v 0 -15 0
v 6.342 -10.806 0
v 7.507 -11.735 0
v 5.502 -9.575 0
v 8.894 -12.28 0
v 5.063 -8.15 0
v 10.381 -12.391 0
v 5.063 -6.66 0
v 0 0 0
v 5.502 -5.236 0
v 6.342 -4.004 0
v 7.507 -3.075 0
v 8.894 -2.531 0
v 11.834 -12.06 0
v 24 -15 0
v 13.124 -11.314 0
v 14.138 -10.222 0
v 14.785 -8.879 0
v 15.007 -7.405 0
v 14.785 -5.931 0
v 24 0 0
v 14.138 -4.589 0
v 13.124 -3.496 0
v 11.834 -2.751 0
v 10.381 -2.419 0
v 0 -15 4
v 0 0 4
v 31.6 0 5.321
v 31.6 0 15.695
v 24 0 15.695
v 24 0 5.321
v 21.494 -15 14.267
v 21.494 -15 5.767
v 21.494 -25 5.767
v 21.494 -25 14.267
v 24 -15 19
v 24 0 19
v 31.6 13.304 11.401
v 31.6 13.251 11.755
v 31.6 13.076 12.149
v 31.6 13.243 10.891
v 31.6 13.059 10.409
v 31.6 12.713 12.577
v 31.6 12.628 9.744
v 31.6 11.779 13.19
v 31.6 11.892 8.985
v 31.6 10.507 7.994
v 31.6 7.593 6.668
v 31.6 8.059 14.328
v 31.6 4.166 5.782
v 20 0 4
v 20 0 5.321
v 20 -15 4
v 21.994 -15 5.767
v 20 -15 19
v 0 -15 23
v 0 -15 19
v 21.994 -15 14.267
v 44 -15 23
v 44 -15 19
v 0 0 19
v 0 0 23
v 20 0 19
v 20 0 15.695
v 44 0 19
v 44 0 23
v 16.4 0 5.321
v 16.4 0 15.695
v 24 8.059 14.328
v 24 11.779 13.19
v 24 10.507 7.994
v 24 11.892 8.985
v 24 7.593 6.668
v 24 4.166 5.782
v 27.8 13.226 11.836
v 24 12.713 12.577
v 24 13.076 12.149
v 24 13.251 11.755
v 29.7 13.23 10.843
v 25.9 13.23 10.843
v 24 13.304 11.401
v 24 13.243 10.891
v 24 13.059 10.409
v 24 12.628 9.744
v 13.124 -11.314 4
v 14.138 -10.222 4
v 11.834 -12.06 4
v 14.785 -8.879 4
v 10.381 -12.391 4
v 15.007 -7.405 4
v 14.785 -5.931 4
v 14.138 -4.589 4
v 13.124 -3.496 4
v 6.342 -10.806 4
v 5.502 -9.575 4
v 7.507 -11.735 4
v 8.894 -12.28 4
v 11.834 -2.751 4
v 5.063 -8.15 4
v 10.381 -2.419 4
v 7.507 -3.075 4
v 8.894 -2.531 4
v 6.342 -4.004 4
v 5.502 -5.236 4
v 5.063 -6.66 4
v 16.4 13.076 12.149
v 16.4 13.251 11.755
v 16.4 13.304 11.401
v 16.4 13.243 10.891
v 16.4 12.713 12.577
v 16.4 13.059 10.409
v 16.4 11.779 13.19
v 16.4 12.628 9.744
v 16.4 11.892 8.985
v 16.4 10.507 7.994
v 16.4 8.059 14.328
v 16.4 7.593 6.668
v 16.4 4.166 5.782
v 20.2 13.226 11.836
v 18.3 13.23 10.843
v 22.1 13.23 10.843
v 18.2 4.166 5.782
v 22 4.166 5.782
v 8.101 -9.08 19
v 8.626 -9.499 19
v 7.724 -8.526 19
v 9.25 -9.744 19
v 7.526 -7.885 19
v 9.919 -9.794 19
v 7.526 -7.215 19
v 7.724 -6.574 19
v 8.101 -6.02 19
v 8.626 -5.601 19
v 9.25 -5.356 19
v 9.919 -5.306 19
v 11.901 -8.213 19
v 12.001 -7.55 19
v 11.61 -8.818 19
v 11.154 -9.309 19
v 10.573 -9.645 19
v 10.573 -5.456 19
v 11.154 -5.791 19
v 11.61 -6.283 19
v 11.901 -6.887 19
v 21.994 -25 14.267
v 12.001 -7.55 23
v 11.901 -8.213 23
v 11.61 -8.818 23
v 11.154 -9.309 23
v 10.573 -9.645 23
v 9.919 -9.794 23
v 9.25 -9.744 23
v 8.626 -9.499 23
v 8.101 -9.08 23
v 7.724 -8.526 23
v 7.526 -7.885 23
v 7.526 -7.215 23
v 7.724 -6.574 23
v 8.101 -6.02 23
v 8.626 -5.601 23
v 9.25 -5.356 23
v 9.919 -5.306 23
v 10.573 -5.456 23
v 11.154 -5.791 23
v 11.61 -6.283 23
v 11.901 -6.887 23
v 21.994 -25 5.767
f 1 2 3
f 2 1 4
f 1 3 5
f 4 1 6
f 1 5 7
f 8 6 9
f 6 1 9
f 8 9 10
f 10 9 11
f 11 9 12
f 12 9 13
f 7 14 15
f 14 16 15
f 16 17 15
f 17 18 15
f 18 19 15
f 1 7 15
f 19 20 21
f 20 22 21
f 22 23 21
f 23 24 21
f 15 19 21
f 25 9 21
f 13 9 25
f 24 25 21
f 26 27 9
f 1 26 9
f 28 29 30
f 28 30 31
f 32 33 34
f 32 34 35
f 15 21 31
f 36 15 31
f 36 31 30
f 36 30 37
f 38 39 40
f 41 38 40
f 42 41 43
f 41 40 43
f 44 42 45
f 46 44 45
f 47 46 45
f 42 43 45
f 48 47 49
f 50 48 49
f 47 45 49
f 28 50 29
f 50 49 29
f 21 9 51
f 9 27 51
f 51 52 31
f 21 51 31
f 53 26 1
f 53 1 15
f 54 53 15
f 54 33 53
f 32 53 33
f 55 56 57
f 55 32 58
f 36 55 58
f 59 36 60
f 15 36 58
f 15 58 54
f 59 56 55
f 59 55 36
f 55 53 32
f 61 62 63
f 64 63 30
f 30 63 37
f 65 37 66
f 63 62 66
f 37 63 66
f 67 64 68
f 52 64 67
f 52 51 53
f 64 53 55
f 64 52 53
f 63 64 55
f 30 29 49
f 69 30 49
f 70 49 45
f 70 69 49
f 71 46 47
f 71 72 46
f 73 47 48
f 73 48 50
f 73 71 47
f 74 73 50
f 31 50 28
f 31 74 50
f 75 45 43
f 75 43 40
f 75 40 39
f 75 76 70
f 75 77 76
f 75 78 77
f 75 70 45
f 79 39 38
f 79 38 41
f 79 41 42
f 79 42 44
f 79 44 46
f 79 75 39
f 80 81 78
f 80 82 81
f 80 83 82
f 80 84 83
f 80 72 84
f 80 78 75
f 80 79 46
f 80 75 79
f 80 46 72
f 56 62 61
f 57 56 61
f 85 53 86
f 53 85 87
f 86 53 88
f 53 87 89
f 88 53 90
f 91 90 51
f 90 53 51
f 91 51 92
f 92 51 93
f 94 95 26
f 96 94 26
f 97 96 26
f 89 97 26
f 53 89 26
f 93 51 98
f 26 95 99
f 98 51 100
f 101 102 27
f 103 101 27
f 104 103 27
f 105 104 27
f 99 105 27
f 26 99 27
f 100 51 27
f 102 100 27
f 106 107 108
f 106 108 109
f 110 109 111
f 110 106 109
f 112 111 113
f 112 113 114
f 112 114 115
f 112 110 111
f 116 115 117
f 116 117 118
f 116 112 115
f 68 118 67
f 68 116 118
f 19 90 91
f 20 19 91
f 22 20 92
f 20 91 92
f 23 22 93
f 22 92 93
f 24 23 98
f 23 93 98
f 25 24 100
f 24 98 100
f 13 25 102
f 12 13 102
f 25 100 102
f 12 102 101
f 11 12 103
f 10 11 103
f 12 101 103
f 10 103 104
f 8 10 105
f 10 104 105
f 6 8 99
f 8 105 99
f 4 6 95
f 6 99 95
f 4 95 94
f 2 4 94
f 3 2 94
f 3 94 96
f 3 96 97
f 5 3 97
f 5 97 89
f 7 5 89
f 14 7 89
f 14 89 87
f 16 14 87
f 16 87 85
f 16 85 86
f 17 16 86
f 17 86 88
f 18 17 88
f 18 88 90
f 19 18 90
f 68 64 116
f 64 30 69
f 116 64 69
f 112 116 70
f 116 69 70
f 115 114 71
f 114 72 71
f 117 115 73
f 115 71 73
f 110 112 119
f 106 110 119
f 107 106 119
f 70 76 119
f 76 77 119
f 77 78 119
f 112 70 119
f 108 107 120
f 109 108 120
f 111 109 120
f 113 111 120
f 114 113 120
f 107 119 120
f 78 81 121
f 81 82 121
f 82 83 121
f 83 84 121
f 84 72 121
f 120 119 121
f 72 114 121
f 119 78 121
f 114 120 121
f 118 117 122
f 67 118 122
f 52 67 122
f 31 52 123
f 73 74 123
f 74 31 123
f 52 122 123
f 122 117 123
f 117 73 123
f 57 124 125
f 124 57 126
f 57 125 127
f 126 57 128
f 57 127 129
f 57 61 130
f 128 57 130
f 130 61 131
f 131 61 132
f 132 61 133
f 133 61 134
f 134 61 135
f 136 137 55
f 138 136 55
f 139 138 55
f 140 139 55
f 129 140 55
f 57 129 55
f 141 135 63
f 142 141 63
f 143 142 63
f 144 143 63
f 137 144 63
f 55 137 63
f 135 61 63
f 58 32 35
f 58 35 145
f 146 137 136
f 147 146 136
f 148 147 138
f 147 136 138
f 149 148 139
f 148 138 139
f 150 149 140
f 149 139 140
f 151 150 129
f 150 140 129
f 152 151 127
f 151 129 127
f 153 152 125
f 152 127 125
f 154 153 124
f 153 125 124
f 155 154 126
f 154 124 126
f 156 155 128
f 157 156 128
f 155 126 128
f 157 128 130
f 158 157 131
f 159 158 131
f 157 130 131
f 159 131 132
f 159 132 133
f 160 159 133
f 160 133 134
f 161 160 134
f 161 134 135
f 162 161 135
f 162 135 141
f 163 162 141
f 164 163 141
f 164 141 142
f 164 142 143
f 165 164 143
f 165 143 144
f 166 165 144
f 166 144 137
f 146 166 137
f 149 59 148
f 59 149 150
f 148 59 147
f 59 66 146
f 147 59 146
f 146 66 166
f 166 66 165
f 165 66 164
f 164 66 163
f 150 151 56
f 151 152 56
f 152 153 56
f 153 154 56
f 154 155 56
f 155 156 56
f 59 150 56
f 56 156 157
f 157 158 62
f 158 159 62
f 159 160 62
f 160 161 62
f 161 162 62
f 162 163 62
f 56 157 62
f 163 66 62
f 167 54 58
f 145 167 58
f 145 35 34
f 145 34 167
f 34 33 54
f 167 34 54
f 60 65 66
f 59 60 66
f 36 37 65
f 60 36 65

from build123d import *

# Parameters (mm, degrees)
F0_W     = 4
F0_H     = 15
F1_DEPTH = 15
F2_R     = 5
F3_DEPTH = 4.001
F4_R     = 2.25
F5_DEPTH = 4.001
F6_W     = 0.5
F6_H     = 8.5
F7_DEPTH = 10
F9_DEPTH = 7.6


with BuildPart() as f1:
    # F0 (on Front) → F1 (new body)
    with BuildSketch(Plane.XZ):
        Polygon((24, 0), (24, 4), (20, 4), (0, 4), (0, 0), align=None)
        with Locations((22, 11.5)):
            Rectangle(F0_W, F0_H)
        Polygon((20, 19), (24, 19), (44, 19), (44, 23), (0, 23), (0, 19), align=None)
    extrude(amount=F1_DEPTH)

    # F2 (on face) → F3 (cut, through all)
    with BuildSketch(Plane.XY.offset(4)):
        with Locations((10.0069084136, -7.405173449)):
            Circle(F2_R)
    extrude(amount=-F3_DEPTH, mode=Mode.SUBTRACT)

    # F4 (on face) → F5 (cut, through all)
    with BuildSketch(Plane(origin=(0, 0, 19), x_dir=(1, 0, 0), z_dir=(0, 0, -1))):
        with Locations((9.7508328035, 7.5500439852)):
            Circle(F4_R)
    extrude(amount=-F5_DEPTH, mode=Mode.SUBTRACT)

    # F6 (on face) → F7 (join)
    with BuildSketch(Plane.XZ.offset(15)):
        with Locations((21.7435011119, 10.0171177201)):
            Rectangle(F6_W, F6_H)
    extrude(amount=F7_DEPTH)

    # F8 (on face) → F9 (join, symmetric)
    with BuildSketch(Plane.YZ.offset(24)):
        with BuildLine():
            add(Edge.make_bspline(
                [(0, 15.6954114159), (6.5394724086, 14.608579241), (18.6393490716, 13.3520301619), (9.1807042924, 5.7328406438), (0, 5.3214114159)],
                knots=[0, 0, 0, 0, 0.4915313854, 1, 1, 1, 1], degree=3))
            Line((0, 15.6954114159), (0, 5.3214114159))
        make_face()
    extrude(amount=F9_DEPTH, both=True)


solid = f1.part
